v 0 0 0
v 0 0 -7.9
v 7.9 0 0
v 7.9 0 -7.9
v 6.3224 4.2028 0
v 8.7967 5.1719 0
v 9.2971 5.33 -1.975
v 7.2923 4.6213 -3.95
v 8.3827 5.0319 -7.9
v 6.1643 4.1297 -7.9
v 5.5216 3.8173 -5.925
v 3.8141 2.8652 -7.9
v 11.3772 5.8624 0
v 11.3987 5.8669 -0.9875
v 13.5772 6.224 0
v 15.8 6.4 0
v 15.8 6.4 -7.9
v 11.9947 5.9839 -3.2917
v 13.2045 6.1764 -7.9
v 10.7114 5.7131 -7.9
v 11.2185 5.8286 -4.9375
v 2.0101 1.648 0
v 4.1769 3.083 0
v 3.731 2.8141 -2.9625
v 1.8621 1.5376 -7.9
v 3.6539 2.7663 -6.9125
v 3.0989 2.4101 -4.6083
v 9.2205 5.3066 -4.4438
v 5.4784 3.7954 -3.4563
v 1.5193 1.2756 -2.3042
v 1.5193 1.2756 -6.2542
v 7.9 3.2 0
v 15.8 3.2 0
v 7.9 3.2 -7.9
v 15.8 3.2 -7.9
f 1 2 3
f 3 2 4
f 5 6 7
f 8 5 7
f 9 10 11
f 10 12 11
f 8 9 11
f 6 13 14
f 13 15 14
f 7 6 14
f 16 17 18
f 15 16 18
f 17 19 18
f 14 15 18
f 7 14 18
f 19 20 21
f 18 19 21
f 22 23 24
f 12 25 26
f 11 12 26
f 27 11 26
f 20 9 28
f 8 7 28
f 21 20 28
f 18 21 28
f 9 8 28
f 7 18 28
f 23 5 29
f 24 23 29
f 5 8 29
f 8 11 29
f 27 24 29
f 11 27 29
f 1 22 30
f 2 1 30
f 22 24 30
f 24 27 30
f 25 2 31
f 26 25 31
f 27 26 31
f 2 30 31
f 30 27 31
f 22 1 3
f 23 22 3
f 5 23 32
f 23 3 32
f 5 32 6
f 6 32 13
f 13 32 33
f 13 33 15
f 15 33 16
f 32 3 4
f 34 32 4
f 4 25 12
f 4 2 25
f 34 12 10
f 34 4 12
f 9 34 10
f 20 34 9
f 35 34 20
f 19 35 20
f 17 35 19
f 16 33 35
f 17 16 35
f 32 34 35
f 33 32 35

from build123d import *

# Parameters (mm, degrees)
SKETCH2_W           = 7.9
SKETCH2_H           = 7.9
BOSS_EXTRUDE1_DEPTH = 3.2
SKETCH3_W           = 7.9
SKETCH3_H           = 7.9
BOSS_EXTRUDE2_DEPTH = 3.2
SKETCH7_W           = 7.9
SKETCH7_H           = 3.2
BOSS_EXTRUDE5_DEPTH = 7.2
CUT_EXTRUDE2_DEPTH  = 8.2


with BuildPart() as part:
    # Sketch2 → Boss-Extrude1 (new body)
    with BuildSketch(Plane(origin=(0, 0, 0), x_dir=(1, 0, 0), z_dir=(0, 1, 0))):
        with Locations((3.95, 3.95)):
            Rectangle(SKETCH2_W, SKETCH2_H)
    extrude(amount=BOSS_EXTRUDE1_DEPTH)



with BuildPart() as body_2:
    # Sketch3 → Boss-Extrude2 (new body)
    with BuildSketch(Plane(origin=(0, 3.2, 0), x_dir=(1, 0, 0), z_dir=(0, 1, 0))):
        with Locations((11.85, 3.95)):
            Rectangle(SKETCH3_W, SKETCH3_H)
    extrude(amount=BOSS_EXTRUDE2_DEPTH)


with BuildPart() as part_1:
    add(part.part)

    add(body_2.part)  # Boss-Extrude5 merges body 2
    # Sketch7 → Boss-Extrude5 (add)
    with BuildSketch(Plane.ZY.offset(-7.9)):
        with Locations((-3.95, 4.8)):
            Rectangle(SKETCH7_W, SKETCH7_H)
    extrude(amount=BOSS_EXTRUDE5_DEPTH)

    # Sketch4 → Cut-Extrude2 (cut)
    with BuildSketch(Plane(origin=(0, 0, -7.9), x_dir=(-1, 0, 0), z_dir=(0, 0, -1))):
        with BuildLine():
            Line((-15.8, 6.4), (0, 6.4))
            Line((0, 6.4), (0, 0))
            add(Edge.make_bspline(
                [(-15.8, 6.4), (-6.684647753, 6.042665729), (0, 0)],
                knots=[0, 0, 0, 1, 1, 1], degree=2))
        make_face()
    extrude(amount=-CUT_EXTRUDE2_DEPTH, mode=Mode.SUBTRACT)


solid = part_1.part
